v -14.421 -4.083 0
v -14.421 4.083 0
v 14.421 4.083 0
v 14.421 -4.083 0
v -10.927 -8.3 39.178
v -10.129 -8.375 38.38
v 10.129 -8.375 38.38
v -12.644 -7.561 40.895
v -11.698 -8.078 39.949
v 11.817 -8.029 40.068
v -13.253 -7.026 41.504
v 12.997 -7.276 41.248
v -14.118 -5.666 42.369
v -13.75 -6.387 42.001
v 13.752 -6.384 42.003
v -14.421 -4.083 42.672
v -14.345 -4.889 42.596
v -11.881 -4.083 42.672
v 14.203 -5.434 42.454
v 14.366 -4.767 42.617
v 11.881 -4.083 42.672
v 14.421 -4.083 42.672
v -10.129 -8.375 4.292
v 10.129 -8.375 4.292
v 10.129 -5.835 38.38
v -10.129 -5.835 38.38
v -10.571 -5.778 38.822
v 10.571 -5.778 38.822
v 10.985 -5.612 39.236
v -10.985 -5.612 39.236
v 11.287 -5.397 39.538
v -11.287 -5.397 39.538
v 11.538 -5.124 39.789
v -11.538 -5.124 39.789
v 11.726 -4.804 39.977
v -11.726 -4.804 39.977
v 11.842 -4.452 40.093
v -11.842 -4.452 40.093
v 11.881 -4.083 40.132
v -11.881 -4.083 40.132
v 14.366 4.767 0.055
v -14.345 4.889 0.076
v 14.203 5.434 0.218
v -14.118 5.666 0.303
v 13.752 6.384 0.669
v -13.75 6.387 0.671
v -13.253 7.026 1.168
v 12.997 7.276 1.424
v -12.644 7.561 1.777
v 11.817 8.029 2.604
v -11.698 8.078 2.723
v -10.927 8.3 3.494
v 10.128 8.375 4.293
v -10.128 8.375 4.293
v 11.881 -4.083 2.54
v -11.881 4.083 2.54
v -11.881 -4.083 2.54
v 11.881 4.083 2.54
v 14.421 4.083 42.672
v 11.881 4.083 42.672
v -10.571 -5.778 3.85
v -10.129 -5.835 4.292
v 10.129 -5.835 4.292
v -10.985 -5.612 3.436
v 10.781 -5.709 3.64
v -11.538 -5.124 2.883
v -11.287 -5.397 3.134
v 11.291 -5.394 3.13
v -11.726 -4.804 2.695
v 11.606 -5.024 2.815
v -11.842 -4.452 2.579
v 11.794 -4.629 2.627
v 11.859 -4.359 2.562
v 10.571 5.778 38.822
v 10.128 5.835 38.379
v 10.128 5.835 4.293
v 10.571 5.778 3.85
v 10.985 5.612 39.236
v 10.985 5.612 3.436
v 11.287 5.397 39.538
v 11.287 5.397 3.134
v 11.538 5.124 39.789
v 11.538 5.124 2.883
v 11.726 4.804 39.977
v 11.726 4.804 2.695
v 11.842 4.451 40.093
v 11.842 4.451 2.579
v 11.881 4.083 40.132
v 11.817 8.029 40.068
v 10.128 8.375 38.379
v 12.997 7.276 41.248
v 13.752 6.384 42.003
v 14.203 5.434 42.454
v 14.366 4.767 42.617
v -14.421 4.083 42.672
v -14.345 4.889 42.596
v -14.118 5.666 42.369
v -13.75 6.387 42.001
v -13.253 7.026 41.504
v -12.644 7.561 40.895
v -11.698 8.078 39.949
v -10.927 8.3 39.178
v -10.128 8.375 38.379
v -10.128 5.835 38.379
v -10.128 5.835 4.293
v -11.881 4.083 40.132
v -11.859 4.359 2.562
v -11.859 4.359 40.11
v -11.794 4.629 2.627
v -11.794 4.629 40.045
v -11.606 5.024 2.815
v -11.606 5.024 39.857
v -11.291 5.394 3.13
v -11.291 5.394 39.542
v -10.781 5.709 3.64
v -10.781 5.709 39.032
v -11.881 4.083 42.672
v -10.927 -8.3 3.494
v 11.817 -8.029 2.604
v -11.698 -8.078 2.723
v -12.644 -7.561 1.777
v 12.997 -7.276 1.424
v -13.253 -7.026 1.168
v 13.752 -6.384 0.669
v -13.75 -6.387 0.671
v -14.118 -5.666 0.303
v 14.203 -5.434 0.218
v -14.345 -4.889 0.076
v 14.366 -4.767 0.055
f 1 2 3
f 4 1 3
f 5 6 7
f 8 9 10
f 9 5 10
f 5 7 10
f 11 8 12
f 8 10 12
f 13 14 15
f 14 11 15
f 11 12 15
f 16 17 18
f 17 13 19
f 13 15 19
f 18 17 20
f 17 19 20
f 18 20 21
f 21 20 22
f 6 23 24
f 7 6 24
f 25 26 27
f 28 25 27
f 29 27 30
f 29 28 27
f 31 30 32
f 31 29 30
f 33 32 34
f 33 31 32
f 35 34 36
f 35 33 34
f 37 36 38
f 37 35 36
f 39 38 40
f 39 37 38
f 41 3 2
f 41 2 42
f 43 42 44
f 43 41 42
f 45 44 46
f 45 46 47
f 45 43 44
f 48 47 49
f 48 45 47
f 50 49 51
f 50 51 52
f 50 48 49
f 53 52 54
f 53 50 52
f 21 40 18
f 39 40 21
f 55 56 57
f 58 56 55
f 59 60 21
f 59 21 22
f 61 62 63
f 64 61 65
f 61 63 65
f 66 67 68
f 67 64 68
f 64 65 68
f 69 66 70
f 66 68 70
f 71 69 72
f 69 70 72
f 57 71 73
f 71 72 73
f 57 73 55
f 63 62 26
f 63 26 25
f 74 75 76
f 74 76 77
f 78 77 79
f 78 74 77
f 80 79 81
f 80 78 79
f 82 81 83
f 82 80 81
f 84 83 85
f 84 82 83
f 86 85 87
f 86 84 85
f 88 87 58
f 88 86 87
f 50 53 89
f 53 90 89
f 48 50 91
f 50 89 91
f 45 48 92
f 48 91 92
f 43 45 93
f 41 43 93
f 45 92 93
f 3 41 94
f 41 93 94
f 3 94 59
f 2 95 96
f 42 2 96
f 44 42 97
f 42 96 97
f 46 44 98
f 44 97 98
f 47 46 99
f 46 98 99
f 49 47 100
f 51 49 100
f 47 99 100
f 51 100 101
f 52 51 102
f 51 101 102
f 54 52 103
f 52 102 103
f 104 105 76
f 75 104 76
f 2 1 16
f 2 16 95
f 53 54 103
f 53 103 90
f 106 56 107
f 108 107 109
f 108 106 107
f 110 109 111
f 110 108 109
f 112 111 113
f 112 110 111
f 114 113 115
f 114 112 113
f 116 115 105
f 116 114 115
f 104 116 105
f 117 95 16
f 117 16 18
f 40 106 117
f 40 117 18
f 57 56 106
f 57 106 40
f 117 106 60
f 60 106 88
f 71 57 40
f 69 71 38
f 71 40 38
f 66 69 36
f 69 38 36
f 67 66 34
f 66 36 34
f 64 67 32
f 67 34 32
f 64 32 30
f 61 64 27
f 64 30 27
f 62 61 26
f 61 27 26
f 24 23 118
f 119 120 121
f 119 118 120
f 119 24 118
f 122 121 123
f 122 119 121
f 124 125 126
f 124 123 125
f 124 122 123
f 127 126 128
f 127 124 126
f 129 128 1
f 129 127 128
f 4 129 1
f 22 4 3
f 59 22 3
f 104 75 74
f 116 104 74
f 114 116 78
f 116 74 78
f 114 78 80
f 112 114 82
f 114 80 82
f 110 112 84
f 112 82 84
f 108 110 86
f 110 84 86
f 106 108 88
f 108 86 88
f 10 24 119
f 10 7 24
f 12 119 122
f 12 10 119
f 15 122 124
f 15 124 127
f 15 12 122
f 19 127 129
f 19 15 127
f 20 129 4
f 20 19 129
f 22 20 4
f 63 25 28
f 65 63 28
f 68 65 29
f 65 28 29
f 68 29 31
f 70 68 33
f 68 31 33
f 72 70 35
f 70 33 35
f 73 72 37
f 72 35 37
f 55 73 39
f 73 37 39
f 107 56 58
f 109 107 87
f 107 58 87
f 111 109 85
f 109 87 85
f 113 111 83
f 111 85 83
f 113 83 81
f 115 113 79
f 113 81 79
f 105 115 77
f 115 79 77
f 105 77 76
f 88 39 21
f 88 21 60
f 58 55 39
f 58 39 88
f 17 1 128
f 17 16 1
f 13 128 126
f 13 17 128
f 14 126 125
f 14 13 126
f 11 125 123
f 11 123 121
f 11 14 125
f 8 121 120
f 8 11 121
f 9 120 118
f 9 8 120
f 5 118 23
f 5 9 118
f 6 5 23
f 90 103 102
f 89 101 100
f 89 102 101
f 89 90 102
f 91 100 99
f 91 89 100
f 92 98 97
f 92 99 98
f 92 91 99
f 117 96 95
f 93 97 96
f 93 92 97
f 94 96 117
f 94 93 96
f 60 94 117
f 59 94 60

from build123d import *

# Parameters (mm, degrees)
F0_W     = 28.842004016
F0_H     = 16.7503710836
F1_DEPTH = 42.672
F2_R     = 4.2924717139
F3_R     = 4.2926
F4_T     = -2.54


# Not quite as in the source:
# - a shell that OpenCascade refuses in one call is made with other operations: the cavity is built on its own and cut out


with BuildPart() as f1:
    # F0 (on Top) → F1 (new body)
    with BuildSketch(Plane.XY):
        Rectangle(F0_W, F0_H)
    extrude(amount=F1_DEPTH)

    # F2
    f2_edges = [f1.edges().sort_by_distance(p)[0] for p in [
        (-14.421002, -8.375186, 21.336),
        (14.421002, -8.375186, 21.336),
        (0, -8.375186, 0),
        (0, -8.375186, 42.672),
    ]]
    fillet(f2_edges, radius=F2_R)

    # F3
    f3_edges = [f1.edges().sort_by_distance(p)[0] for p in [
        (14.421002, 8.375186, 21.336),
        (-14.421002, 8.375186, 21.336),
        (0, 8.375186, 0),
        (0, 8.375186, 42.672),
    ]]
    fillet(f3_edges, radius=F3_R)

    # F4: a shell. OpenCascade refuses it in one call, so the cavity is built on its own and cut out:
    # the body offset inwards by the wall thickness, plus a prism from it out through each open face.
    f4_core = offset(f1.part, amount=F4_T, mode=Mode.PRIVATE)
    f4_exits = [f4_core.faces().sort_by_distance(p)[0] for p in [
        (0, -6.4e-05, 40.132),
    ]]
    add(f4_core, mode=Mode.SUBTRACT)
    extrude(f4_exits, amount=-F4_T, mode=Mode.SUBTRACT)


solid = f1.part
